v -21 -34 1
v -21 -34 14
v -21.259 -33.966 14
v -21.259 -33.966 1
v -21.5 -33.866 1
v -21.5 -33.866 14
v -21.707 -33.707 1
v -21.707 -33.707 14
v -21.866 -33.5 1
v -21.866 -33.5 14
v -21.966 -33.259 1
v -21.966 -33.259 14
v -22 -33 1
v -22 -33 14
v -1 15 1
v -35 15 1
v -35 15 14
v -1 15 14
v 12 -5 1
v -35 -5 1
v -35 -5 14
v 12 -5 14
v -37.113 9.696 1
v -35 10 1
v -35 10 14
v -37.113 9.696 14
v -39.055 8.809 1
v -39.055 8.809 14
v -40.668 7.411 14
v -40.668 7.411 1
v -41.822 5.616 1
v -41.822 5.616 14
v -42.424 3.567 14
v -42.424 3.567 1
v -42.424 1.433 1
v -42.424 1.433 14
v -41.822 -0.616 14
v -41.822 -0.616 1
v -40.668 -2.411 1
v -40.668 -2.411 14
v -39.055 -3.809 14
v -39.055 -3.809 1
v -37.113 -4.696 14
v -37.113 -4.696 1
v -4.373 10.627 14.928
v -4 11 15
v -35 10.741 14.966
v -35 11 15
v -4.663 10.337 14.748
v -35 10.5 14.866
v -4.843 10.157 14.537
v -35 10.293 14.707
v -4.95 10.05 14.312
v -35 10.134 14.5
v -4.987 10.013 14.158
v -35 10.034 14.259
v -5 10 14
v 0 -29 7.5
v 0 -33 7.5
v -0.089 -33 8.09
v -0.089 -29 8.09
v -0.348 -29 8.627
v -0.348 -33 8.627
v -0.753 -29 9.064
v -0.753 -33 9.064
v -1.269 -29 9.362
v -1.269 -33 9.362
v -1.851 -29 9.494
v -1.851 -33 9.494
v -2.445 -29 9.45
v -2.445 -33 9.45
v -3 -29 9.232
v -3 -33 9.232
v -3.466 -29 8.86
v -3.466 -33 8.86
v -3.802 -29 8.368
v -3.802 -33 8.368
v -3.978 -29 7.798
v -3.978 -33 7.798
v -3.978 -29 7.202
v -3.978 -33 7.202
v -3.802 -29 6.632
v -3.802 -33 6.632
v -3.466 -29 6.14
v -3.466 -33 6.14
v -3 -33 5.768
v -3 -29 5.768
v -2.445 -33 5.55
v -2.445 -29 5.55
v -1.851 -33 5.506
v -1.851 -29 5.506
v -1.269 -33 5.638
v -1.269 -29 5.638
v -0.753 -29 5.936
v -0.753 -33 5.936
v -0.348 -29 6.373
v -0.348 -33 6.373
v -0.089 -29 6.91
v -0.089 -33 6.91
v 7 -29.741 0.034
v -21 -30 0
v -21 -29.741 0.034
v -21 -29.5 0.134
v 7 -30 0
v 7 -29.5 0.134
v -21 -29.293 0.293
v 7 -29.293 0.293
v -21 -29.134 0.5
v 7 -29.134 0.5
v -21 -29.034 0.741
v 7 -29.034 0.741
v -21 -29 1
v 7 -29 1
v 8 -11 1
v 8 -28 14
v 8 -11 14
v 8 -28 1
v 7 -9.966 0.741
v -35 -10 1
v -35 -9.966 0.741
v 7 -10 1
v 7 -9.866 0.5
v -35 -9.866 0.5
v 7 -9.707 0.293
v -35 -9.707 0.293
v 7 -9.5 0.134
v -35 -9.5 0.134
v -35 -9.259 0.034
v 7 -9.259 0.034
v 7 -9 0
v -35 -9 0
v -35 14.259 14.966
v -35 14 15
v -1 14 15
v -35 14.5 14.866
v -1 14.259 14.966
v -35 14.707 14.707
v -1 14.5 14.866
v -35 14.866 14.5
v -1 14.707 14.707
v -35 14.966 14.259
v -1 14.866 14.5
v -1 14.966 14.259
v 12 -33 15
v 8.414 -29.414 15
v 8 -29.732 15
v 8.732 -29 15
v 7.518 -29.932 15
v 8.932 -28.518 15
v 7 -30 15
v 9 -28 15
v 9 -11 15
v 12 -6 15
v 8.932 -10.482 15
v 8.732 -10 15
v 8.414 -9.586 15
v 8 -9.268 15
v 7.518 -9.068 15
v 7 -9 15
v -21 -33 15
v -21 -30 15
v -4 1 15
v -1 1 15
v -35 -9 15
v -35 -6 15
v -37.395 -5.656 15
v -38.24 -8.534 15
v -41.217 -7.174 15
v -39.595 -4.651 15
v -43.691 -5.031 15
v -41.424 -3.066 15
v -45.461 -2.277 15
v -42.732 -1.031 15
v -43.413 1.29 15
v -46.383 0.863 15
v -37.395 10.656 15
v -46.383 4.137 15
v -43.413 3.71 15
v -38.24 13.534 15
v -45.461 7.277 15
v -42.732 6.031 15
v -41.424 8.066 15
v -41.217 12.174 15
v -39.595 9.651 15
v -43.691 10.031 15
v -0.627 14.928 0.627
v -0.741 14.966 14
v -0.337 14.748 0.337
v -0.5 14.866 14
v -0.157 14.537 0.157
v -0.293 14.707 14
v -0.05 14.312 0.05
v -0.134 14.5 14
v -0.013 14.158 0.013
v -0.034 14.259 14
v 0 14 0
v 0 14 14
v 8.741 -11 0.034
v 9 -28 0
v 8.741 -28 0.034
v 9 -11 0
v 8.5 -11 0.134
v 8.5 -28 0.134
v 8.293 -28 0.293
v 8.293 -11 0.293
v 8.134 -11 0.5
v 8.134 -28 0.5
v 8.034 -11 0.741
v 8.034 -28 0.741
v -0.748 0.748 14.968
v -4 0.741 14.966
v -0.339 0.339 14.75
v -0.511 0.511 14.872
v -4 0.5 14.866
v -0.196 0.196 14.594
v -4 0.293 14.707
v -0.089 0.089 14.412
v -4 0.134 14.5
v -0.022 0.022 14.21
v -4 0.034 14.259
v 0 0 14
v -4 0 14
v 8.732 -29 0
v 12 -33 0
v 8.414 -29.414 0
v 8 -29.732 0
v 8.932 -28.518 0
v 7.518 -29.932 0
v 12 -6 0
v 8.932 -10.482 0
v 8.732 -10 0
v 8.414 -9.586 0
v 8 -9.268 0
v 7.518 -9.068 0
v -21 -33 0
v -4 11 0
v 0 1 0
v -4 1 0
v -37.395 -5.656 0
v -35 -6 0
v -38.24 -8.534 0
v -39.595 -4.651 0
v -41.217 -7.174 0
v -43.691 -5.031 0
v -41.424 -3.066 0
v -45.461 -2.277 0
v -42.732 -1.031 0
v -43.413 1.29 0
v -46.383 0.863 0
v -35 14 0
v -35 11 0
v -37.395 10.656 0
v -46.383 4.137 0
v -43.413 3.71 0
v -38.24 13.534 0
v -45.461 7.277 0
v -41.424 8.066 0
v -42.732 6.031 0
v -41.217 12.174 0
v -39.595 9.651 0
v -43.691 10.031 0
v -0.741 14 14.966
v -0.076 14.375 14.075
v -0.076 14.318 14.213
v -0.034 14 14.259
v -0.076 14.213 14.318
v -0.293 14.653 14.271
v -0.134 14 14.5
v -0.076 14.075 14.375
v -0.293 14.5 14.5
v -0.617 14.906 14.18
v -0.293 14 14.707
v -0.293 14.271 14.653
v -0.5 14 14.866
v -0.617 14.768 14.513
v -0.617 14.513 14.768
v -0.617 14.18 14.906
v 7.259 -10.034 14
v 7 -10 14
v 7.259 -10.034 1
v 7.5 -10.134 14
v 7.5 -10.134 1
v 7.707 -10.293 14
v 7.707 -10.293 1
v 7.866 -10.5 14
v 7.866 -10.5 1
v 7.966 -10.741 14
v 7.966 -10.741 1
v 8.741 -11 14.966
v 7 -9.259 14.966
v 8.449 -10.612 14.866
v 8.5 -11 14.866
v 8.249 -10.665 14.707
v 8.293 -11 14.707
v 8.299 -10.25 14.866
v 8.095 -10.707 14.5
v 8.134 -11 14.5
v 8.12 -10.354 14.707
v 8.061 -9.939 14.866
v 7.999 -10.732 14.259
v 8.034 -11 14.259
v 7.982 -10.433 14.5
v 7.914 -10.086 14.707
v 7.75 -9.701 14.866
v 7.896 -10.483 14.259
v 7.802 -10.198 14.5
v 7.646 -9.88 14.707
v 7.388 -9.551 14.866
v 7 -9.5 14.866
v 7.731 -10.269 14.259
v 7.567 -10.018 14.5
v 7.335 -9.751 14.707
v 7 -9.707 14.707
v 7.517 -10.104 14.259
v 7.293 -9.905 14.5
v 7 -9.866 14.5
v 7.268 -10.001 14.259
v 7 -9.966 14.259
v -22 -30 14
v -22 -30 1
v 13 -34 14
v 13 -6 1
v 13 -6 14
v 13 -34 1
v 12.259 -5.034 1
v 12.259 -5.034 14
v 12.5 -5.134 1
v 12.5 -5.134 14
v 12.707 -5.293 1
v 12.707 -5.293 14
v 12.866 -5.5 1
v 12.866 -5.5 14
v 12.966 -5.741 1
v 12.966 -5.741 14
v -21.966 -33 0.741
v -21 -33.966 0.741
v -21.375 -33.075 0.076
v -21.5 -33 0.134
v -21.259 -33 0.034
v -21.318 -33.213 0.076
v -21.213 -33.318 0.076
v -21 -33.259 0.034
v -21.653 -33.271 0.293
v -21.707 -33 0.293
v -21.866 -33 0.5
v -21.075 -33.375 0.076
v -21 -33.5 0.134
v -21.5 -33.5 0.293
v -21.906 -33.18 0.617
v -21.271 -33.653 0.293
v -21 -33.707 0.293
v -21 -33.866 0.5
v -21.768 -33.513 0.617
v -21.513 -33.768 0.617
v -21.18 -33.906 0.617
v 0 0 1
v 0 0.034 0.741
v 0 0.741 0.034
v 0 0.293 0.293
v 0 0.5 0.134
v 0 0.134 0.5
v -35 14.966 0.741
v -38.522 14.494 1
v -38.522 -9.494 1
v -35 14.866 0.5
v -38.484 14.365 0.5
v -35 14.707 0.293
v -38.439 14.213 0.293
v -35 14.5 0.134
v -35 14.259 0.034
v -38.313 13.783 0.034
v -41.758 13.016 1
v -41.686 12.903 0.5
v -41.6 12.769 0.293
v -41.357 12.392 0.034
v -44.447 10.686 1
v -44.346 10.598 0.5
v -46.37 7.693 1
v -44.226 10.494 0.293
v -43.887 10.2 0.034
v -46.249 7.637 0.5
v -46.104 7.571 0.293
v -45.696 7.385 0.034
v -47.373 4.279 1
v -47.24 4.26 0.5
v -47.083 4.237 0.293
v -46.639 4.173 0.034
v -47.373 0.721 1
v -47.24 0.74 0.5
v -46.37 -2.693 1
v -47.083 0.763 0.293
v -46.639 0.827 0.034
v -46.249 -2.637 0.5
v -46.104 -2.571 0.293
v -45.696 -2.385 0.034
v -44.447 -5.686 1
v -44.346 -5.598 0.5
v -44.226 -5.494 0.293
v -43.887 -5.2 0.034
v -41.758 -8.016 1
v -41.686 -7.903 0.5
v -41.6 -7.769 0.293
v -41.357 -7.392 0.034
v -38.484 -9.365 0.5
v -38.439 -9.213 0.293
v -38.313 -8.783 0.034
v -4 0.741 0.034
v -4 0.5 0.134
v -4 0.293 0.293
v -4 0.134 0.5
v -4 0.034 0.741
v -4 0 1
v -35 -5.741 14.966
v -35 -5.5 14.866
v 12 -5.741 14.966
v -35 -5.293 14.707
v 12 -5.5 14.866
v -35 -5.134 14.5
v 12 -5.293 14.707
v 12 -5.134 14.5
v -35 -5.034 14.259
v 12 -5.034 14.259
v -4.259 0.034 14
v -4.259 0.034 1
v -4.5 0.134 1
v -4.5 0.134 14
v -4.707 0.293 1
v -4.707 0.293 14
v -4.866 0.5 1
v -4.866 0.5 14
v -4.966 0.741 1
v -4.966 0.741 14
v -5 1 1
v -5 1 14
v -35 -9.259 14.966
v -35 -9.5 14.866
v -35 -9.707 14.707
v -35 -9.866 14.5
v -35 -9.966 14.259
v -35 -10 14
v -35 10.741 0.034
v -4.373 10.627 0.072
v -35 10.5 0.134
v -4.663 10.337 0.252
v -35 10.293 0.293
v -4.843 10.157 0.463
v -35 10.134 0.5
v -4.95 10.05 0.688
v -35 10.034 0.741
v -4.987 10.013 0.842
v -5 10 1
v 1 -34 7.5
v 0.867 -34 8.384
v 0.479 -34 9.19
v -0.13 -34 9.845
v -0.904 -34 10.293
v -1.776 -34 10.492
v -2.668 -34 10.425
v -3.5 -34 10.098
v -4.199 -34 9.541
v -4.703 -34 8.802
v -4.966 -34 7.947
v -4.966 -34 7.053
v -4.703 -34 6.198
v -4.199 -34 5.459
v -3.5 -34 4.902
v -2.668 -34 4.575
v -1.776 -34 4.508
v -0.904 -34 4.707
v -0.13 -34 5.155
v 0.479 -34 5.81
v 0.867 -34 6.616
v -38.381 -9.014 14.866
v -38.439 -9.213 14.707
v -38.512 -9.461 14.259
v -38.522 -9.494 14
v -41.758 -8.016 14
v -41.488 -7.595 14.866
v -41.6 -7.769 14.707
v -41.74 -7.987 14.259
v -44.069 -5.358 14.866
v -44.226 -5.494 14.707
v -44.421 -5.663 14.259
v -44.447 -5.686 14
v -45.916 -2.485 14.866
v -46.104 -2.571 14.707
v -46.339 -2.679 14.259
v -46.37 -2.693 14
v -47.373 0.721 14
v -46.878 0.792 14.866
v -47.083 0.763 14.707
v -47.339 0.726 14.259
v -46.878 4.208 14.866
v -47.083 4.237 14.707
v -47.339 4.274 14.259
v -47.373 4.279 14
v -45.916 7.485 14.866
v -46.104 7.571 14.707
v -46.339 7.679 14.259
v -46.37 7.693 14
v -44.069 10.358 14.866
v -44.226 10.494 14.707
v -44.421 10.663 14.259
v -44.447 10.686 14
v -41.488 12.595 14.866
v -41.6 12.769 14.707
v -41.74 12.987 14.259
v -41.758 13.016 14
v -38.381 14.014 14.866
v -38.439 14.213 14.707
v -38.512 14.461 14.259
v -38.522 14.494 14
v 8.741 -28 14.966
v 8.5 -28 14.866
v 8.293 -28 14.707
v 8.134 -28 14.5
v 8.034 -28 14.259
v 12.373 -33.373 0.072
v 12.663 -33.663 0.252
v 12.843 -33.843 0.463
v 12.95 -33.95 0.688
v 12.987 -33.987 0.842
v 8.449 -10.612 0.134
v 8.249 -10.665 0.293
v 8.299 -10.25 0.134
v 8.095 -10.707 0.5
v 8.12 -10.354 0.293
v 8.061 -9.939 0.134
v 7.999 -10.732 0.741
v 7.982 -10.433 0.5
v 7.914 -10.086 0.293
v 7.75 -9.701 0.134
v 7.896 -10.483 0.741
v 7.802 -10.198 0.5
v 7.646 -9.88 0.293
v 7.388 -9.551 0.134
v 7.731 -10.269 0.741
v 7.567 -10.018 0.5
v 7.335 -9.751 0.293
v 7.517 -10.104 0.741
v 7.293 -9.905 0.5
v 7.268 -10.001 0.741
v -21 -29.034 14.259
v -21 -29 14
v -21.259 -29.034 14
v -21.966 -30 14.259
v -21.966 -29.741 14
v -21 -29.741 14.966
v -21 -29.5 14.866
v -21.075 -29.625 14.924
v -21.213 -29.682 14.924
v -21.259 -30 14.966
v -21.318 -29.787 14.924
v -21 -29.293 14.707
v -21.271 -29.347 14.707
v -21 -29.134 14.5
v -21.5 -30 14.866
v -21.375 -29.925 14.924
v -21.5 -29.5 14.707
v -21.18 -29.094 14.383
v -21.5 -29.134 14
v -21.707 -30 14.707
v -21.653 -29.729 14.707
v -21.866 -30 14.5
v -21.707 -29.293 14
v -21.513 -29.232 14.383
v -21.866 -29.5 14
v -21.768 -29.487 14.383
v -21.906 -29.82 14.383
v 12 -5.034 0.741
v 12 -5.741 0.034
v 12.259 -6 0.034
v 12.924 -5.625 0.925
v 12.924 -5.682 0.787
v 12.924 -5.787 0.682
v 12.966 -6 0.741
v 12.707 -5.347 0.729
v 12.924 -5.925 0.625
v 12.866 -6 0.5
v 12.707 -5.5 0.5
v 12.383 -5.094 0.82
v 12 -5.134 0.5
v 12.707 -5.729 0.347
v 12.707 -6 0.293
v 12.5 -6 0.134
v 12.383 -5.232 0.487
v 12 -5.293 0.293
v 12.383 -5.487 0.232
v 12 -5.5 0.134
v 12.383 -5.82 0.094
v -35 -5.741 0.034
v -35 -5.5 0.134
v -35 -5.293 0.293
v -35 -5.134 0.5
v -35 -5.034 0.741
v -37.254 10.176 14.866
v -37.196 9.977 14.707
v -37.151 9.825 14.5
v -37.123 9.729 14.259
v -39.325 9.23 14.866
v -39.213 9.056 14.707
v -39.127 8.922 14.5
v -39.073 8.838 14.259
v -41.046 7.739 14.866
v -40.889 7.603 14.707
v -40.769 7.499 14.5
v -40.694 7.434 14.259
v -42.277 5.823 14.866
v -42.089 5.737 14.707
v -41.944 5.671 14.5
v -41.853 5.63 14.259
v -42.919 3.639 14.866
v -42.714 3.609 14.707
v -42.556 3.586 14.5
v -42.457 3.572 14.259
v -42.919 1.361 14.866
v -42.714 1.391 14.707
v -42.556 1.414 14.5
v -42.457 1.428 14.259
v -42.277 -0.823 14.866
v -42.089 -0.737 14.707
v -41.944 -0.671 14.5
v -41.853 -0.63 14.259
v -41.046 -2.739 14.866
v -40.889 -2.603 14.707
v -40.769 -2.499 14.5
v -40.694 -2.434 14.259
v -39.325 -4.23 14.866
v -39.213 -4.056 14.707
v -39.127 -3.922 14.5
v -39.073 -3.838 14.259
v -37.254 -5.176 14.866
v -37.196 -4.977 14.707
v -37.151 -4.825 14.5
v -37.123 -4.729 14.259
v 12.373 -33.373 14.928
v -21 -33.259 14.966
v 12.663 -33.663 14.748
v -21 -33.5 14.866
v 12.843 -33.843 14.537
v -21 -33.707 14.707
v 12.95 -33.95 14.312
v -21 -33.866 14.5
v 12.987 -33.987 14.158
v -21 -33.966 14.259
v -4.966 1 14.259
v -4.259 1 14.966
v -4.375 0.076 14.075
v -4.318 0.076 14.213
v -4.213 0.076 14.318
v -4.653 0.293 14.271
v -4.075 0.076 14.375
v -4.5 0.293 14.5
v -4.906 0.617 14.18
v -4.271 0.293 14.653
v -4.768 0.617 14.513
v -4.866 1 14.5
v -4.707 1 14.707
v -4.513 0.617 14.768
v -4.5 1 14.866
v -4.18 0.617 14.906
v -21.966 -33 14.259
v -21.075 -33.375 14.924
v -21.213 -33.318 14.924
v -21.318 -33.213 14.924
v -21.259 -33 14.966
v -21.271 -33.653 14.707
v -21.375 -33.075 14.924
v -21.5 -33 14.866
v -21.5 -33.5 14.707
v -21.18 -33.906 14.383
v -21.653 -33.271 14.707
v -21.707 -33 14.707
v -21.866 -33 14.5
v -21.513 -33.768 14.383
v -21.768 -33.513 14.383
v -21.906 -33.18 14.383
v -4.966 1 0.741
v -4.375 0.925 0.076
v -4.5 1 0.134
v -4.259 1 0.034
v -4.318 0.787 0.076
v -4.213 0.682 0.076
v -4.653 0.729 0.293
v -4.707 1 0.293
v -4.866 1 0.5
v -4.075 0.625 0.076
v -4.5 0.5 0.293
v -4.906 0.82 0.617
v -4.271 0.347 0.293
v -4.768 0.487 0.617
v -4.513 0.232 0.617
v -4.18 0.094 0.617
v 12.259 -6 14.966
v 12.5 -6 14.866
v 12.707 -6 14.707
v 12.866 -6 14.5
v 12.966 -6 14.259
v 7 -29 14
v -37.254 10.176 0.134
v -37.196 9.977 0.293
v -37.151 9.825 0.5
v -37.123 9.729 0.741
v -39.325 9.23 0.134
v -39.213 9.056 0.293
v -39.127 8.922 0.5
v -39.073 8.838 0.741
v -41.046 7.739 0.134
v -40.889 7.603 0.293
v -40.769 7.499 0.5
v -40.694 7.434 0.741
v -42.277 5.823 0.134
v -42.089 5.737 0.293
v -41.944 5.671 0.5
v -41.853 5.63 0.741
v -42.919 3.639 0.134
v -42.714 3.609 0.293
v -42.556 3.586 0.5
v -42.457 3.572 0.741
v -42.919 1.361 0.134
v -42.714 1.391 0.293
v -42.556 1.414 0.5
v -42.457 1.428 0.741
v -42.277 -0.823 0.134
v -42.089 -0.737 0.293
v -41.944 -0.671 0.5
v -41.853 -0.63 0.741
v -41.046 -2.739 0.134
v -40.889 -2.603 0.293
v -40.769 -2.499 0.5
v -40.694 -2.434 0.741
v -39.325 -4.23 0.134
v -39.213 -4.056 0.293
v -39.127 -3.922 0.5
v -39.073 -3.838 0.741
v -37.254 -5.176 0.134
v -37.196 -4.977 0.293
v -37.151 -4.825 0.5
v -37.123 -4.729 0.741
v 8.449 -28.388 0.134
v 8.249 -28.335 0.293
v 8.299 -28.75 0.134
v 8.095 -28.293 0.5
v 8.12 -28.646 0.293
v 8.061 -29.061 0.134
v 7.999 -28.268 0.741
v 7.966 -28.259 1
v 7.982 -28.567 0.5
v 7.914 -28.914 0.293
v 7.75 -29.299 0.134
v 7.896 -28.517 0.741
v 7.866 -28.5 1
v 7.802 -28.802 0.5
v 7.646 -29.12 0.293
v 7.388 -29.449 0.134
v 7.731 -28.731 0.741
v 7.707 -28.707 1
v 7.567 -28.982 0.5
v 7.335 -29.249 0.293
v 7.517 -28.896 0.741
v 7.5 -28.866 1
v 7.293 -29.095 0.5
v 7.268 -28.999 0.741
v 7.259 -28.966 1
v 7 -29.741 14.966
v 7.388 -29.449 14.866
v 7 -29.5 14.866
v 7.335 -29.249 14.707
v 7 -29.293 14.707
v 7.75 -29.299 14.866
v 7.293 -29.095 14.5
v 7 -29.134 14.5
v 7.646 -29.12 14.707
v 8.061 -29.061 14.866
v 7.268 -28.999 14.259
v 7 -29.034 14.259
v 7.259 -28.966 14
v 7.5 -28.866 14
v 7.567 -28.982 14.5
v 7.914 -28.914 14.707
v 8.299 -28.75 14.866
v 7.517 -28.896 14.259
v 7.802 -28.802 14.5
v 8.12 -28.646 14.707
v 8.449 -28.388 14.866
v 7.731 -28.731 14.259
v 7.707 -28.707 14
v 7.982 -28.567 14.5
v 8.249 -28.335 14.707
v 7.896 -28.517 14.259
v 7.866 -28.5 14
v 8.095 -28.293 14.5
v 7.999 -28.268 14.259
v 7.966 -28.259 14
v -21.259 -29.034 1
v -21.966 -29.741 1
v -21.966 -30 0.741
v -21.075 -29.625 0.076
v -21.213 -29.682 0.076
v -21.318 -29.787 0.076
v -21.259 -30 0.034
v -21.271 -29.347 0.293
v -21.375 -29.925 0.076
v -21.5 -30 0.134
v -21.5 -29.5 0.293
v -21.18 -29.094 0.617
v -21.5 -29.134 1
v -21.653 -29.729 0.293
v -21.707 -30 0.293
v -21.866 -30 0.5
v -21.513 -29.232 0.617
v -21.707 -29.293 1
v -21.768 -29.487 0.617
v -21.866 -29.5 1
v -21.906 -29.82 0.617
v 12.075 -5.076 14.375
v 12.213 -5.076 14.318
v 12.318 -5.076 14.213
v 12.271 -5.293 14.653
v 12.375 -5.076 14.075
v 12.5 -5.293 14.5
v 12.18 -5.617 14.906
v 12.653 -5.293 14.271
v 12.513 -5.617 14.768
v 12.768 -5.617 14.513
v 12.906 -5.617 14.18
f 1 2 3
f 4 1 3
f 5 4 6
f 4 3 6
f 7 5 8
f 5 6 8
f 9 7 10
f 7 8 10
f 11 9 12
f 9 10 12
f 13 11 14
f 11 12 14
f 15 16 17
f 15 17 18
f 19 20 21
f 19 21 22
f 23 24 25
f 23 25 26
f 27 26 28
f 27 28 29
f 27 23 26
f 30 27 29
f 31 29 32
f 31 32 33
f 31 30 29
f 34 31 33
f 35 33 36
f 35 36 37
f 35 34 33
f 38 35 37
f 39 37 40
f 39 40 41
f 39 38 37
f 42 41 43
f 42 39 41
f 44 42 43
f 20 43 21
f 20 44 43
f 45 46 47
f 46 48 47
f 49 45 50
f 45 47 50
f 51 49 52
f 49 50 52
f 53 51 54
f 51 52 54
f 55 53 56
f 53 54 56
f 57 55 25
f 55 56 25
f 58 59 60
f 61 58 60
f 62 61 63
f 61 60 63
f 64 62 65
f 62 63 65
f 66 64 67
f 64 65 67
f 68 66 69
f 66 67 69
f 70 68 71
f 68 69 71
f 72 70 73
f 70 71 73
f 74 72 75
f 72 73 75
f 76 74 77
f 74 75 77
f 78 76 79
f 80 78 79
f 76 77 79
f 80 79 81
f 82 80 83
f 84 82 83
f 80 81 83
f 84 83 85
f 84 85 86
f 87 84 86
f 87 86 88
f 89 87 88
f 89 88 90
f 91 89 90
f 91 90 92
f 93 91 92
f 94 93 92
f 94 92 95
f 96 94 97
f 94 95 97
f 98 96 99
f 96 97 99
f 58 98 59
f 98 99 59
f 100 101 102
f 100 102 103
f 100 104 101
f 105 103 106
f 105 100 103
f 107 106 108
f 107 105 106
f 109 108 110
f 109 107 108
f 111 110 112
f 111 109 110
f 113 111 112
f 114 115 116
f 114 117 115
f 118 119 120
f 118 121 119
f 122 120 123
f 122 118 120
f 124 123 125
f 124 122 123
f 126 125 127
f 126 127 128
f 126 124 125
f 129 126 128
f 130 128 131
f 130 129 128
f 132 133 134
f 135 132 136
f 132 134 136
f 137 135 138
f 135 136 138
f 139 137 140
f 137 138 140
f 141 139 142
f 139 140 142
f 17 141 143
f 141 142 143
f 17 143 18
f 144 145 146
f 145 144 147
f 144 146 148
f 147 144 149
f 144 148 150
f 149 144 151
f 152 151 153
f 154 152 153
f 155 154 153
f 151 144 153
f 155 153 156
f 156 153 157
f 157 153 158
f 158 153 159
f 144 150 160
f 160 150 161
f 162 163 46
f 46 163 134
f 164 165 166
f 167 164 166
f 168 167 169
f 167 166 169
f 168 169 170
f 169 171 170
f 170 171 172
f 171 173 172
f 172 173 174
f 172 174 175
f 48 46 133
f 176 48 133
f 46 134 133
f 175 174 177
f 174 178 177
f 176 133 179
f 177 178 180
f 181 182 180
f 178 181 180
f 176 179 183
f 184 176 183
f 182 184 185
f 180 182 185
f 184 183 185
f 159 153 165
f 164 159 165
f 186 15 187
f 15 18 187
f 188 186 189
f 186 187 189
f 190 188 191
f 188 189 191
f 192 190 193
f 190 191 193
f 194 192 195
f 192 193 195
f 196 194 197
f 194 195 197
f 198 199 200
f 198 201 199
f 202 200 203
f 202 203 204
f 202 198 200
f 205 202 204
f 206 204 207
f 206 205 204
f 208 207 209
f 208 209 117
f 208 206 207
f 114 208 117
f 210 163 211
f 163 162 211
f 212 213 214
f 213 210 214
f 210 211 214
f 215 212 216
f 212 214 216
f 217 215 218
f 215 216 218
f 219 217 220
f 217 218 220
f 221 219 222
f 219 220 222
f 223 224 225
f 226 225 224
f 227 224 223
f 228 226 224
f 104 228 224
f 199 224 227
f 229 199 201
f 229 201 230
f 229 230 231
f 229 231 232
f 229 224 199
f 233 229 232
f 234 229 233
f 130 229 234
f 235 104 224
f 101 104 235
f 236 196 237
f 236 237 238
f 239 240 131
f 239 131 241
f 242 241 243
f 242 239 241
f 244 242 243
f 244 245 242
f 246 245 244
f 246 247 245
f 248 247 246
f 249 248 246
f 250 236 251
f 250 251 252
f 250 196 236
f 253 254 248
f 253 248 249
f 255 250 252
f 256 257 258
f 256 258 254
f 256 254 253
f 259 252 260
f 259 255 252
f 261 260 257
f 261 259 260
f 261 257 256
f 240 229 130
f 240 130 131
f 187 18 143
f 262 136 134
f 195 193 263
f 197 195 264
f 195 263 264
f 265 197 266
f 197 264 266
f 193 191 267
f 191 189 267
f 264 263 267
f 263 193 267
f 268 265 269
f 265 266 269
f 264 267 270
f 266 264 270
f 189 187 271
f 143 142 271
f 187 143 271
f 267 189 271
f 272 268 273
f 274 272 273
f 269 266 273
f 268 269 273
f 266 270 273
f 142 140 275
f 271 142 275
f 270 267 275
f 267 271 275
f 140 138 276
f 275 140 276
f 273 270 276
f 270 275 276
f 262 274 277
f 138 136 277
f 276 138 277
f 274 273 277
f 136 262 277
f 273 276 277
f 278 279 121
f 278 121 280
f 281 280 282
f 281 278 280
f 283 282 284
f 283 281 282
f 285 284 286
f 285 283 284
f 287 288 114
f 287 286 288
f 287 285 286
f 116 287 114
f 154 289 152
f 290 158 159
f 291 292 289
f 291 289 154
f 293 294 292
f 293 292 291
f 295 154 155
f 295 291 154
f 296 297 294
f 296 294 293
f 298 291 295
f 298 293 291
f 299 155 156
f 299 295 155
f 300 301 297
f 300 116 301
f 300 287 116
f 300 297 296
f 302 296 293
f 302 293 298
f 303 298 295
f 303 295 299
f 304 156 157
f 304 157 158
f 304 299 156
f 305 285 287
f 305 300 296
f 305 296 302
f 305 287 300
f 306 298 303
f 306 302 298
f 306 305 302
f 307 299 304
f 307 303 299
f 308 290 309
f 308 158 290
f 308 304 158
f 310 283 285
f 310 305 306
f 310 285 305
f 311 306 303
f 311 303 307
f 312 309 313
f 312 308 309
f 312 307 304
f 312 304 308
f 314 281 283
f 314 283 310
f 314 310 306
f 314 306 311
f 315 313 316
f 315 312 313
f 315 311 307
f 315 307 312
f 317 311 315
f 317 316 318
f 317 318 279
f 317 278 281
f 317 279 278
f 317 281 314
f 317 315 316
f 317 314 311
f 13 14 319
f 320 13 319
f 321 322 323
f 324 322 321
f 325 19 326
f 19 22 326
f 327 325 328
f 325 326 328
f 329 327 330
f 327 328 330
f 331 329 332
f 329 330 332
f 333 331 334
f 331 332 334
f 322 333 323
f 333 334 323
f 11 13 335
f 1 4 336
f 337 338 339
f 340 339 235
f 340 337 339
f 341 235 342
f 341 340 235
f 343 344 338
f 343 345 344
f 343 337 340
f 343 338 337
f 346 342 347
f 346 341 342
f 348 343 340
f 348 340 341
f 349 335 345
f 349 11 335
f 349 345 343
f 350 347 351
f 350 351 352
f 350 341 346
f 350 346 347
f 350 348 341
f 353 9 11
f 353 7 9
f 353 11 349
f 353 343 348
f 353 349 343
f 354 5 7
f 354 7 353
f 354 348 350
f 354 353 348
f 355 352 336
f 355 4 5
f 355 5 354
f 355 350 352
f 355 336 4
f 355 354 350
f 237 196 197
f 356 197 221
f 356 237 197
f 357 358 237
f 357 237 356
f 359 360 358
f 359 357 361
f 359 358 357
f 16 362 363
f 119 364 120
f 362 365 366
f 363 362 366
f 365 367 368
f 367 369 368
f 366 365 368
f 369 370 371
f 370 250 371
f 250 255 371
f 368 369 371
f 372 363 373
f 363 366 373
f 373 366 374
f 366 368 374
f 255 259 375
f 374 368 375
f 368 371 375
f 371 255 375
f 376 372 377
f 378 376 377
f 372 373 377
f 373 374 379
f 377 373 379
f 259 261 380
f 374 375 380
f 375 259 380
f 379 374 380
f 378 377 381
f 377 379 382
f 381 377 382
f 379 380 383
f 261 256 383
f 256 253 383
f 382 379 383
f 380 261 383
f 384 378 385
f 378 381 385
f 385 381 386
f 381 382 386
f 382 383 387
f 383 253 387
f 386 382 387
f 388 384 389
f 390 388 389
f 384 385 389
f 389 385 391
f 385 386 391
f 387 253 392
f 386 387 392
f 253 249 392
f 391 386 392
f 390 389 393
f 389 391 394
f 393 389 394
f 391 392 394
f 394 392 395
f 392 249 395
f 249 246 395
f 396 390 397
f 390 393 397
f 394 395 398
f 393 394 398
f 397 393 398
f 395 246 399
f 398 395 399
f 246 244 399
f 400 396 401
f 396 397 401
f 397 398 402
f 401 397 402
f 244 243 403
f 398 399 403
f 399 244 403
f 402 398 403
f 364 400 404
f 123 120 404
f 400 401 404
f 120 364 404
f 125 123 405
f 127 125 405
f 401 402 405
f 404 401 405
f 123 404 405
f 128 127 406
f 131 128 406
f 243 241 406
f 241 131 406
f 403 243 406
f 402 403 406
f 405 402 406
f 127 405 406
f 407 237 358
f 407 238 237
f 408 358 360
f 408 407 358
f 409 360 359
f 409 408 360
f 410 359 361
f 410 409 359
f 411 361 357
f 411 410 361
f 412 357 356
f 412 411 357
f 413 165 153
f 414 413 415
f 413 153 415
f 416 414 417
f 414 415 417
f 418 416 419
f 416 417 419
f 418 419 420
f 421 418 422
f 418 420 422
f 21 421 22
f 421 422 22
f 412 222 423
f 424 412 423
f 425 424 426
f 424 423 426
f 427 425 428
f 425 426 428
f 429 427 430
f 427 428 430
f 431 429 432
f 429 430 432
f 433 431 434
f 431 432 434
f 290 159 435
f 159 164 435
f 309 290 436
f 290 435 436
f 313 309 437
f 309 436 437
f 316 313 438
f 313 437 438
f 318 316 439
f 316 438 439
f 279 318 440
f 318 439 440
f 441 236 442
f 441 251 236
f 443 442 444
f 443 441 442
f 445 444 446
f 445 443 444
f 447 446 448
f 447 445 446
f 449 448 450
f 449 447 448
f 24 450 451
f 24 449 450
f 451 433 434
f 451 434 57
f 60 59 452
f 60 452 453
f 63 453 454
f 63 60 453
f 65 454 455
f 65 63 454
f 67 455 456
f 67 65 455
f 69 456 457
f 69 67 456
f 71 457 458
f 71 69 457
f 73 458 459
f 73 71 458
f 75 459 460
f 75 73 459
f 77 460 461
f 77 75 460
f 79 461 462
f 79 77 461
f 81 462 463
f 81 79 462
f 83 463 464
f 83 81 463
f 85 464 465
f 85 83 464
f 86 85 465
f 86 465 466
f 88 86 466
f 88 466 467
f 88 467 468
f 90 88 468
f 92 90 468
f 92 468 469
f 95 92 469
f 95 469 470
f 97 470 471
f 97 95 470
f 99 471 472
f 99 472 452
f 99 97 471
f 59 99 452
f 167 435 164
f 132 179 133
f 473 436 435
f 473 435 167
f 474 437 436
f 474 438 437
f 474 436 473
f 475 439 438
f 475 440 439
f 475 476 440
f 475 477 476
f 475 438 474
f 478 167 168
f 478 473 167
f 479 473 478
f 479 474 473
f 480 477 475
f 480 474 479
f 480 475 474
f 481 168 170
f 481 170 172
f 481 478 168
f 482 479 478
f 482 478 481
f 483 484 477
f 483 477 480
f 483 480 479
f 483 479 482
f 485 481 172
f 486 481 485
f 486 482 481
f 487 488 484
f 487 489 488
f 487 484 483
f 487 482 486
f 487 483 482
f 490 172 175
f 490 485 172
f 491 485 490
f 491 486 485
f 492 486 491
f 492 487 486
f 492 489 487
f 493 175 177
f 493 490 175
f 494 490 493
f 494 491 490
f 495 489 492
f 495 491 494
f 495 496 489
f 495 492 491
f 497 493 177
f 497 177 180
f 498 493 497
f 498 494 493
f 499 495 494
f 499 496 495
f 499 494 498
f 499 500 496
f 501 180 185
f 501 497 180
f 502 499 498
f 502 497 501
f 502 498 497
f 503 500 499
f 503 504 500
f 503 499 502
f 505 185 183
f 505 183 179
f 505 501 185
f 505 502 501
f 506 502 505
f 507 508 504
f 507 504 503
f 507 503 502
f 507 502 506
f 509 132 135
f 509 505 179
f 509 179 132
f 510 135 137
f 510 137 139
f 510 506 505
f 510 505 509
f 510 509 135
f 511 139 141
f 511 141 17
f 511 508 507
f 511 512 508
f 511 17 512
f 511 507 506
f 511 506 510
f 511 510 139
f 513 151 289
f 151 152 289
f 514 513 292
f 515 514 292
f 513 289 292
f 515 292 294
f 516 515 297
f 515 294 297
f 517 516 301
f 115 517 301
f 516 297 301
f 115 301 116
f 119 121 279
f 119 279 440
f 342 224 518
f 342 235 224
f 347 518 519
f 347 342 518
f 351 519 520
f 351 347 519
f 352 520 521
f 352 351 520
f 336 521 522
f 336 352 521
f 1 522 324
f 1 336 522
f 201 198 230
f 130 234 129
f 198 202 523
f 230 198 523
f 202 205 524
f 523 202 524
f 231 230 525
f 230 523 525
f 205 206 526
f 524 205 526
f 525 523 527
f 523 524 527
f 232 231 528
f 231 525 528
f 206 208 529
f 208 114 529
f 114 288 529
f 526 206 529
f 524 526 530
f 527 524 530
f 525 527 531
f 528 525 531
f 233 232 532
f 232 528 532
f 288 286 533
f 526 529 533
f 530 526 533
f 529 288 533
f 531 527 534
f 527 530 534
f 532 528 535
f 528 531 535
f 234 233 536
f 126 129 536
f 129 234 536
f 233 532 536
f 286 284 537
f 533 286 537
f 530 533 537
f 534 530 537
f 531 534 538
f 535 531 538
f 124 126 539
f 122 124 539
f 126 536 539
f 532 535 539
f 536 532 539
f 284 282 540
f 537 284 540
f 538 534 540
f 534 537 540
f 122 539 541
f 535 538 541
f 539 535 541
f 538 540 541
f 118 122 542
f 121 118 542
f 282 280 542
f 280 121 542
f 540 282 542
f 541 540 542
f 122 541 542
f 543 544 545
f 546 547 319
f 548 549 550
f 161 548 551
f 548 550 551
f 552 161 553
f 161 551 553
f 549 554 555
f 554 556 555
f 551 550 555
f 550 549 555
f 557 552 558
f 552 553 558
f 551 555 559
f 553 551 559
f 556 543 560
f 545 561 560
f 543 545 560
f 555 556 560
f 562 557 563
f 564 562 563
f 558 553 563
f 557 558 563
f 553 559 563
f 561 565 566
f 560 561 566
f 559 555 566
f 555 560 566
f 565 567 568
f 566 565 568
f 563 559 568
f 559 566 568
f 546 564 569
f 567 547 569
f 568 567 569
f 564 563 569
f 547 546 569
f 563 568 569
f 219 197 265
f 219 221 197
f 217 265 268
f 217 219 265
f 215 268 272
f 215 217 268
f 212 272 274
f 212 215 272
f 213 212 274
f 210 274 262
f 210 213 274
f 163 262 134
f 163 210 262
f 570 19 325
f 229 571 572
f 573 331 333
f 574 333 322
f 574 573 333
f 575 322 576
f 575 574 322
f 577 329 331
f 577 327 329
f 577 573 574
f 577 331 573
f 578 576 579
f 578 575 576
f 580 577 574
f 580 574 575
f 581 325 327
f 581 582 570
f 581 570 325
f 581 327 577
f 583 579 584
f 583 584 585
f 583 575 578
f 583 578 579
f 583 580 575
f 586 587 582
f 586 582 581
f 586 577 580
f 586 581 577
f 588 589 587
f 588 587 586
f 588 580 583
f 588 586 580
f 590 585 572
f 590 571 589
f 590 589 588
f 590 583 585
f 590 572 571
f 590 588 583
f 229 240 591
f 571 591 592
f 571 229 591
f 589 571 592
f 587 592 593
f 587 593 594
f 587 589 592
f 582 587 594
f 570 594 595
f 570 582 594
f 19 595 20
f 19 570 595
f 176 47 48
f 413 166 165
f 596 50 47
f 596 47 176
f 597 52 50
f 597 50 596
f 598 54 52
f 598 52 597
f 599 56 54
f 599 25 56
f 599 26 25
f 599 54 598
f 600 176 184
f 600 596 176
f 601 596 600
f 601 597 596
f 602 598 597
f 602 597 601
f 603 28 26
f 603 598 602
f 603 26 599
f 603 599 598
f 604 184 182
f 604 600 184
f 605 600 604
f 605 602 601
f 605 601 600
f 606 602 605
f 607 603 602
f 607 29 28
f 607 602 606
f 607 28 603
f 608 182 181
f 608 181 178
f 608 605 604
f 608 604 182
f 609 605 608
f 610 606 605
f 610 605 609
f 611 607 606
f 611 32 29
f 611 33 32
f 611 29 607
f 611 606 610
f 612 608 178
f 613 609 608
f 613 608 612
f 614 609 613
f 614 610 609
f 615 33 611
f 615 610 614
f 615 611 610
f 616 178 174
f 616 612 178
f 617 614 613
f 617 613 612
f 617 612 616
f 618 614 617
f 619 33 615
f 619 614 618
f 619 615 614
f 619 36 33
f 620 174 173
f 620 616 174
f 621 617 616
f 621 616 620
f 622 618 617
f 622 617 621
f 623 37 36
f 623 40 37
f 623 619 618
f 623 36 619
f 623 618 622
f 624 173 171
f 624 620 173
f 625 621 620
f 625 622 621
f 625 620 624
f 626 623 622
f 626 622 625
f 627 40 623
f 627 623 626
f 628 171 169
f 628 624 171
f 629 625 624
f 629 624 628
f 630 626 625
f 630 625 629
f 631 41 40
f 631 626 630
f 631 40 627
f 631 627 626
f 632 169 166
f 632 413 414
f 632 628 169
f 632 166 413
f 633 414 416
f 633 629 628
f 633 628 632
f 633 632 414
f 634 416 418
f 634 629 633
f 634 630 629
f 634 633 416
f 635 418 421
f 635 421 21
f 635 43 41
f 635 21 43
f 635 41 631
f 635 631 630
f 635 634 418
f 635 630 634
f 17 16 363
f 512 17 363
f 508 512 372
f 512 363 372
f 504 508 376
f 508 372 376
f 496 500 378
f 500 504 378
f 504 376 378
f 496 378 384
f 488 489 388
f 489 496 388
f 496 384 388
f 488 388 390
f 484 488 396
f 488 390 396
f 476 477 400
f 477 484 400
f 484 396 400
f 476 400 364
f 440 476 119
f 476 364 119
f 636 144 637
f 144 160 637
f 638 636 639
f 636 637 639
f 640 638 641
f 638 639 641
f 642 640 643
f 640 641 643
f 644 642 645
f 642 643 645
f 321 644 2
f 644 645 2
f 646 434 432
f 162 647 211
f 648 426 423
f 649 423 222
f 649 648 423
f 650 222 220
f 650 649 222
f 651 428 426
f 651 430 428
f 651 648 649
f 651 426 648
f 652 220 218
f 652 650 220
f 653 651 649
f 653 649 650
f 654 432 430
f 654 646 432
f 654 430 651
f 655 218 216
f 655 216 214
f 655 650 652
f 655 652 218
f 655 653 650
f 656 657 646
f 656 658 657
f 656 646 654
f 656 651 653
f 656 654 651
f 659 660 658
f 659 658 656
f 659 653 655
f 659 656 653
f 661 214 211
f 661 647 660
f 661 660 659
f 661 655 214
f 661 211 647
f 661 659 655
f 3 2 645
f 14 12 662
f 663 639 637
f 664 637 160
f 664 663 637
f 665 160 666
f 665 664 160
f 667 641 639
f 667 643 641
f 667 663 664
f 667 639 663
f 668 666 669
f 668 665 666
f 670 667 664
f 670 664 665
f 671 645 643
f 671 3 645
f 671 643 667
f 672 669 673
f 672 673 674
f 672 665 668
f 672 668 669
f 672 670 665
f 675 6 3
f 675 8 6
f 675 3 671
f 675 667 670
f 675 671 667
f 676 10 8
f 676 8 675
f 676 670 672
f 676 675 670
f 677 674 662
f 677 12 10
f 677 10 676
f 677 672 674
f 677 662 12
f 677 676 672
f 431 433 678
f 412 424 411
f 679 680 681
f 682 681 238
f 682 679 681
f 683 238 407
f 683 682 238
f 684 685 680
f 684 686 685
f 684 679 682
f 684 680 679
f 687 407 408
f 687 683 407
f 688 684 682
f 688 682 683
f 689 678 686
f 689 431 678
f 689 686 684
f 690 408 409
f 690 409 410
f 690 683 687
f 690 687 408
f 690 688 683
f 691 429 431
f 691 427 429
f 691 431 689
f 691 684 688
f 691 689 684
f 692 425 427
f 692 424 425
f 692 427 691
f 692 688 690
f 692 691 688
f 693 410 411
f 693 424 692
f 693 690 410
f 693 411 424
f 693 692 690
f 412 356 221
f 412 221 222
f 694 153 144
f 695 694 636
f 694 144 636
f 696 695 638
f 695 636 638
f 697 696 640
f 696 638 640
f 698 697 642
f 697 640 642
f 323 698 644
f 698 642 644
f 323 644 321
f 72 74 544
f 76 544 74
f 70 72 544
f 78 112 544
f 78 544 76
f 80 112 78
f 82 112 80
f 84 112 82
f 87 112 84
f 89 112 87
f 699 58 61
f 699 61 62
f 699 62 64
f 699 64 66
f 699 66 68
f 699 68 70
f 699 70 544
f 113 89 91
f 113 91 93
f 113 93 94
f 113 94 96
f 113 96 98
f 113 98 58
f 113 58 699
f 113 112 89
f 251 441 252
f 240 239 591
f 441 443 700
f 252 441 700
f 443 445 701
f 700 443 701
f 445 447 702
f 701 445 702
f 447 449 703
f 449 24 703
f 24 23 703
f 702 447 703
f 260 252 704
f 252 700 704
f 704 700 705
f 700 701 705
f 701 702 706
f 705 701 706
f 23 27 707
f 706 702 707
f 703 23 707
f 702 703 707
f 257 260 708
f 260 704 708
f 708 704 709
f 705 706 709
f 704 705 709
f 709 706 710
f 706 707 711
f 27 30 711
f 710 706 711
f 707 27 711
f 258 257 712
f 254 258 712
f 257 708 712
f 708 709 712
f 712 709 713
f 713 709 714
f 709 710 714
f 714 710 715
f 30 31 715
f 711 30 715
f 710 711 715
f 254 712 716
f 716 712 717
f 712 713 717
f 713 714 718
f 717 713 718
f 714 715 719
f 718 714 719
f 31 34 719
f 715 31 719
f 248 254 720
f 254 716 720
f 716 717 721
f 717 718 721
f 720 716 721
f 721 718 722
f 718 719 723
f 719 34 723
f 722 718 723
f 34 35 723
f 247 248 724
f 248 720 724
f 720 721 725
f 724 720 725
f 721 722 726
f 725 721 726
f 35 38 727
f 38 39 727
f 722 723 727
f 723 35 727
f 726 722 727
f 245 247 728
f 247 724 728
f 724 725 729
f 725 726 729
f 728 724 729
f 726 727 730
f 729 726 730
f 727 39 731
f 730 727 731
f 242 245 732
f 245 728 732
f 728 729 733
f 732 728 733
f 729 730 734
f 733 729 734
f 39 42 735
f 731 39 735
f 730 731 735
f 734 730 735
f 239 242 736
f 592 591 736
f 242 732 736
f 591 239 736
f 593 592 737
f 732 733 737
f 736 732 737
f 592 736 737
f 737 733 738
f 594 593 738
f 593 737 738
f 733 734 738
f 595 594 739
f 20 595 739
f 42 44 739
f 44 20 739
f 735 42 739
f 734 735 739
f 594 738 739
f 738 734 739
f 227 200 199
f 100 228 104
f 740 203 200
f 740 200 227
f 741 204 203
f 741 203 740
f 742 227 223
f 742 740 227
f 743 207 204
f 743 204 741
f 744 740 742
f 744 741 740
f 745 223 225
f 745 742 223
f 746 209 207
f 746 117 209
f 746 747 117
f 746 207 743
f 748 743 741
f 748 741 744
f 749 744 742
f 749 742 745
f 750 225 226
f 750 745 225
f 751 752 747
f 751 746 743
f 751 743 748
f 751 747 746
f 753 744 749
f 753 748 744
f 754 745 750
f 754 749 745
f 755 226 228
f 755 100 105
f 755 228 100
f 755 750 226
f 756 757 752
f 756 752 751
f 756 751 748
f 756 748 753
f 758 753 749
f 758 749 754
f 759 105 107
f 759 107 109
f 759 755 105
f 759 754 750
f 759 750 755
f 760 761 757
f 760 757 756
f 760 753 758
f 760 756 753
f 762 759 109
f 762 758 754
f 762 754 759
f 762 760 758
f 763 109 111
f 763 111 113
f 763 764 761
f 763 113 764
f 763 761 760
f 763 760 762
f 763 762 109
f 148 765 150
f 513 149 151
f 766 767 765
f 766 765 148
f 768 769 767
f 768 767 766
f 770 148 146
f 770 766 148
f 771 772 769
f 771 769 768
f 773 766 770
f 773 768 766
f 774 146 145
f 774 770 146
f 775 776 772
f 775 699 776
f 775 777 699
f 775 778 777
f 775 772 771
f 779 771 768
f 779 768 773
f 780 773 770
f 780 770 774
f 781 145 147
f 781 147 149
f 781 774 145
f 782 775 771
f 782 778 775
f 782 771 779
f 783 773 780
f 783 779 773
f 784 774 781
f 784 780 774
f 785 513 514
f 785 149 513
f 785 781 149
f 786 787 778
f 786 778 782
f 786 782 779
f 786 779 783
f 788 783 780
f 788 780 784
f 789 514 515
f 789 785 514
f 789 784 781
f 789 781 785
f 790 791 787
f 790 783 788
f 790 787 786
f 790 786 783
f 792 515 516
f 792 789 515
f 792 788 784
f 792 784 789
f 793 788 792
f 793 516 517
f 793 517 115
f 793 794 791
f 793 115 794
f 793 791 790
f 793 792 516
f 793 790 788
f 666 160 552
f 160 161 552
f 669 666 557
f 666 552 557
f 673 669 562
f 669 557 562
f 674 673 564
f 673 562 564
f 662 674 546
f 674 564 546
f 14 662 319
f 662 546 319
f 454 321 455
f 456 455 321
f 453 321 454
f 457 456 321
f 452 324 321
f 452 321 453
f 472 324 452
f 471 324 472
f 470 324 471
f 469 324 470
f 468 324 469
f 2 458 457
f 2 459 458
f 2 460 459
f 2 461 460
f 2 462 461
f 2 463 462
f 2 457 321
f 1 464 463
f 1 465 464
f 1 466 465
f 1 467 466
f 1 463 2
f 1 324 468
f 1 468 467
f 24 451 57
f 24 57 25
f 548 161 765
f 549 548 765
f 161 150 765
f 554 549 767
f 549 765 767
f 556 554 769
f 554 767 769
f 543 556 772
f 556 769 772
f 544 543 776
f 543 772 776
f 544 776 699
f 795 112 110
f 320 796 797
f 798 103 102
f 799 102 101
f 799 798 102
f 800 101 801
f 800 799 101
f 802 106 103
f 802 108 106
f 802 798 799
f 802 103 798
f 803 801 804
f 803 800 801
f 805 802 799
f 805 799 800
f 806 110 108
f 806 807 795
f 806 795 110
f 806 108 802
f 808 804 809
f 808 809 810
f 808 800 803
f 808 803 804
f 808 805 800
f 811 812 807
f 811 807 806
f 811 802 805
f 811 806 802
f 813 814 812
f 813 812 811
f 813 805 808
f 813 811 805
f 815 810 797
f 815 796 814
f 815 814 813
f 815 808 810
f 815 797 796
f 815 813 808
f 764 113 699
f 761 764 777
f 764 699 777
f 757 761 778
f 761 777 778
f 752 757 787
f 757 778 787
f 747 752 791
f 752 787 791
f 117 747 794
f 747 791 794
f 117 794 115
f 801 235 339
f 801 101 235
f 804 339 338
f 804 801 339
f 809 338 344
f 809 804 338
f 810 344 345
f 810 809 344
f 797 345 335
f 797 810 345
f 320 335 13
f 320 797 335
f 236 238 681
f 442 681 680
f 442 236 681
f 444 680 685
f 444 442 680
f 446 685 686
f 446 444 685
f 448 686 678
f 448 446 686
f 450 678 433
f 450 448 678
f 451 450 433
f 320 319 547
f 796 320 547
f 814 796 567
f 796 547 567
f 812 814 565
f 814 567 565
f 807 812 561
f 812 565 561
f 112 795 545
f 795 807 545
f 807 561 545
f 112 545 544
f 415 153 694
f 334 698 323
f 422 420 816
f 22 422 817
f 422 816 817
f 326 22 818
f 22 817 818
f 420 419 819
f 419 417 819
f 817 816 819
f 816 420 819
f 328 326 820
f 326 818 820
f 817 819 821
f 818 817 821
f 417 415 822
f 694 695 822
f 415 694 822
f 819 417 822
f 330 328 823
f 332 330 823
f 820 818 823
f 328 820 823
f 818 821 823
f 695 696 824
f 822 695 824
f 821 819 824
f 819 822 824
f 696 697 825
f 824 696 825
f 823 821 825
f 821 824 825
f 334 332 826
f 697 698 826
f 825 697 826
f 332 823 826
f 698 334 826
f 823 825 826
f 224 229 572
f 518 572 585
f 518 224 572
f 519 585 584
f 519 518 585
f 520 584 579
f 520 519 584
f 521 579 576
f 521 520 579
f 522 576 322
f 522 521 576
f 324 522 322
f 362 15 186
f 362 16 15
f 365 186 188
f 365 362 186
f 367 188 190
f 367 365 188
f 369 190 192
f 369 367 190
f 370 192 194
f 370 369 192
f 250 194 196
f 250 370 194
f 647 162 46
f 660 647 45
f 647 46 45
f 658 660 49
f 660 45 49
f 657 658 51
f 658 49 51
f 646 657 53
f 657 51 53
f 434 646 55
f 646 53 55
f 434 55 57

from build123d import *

# Parameters (mm, degrees)
PAD001_DEPTH    = 15
SKETCH003_R     = 2
POCKET001_DEPTH = 5
FILLET001_R     = 1
CHAMFER001_SIZE = 1


with BuildPart() as part:
    # Sketch002 → Pad001 (new body)
    with BuildSketch(Plane.XY):
        with BuildLine():
            Line((-35, 15), (0, 15))
            Line((0, 15), (0, 0))
            Line((0, 0), (-5, 0))
            Line((-5, 0), (-5, 10))
            Line((-5, 10), (-35, 10))
            ThreePointArc((-35, 10), (-42.5, 2.5), (-35, -5))
            Line((-35, -5), (13, -5))
            Line((13, -5), (13, -34))
            Line((13, -34), (-22, -34))
            Line((-22, -34), (-22, -29))
            Line((-22, -29), (8, -29))
            Line((8, -29), (8, -10))
            Line((8, -10), (-35, -10))
            ThreePointArc((-35, 15), (-47.5, 2.5), (-35, -10))
        make_face()
    extrude(amount=PAD001_DEPTH)

    # Sketch003 (on Face9 of Pad001) → Pocket001 (cut)
    with BuildSketch(Plane.XZ.offset(34)):
        with Locations((-2, 7.5)):
            Circle(SKETCH003_R)
    extrude(amount=-POCKET001_DEPTH, mode=Mode.SUBTRACT)

    # Fillet001
    fillet001_edges = [part.edges().sort_by_distance(p)[0] for p in [
        (-22, -29, 7.5),
        (-22, -34, 7.5),
        (-4.5, -34, 15),
        (-7, -29, 15),
        (-7, -29, 0),
        (13, -19.5, 15),
        (8, -19.5, 15),
        (-13.5, -10, 15),
        (-47.5, 2.5, 15),
        (-42.5, 2.5, 15),
        (-47.5, 2.5, 0),
        (-17.5, 15, 0),
        (-17.5, 15, 15),
        (0, 15, 7.5),
        (0, 7.5, 15),
        (-20, 10, 15),
        (-42.5, 2.5, 0),
        (-11, -5, 0),
        (-5, 5, 15),
        (-5, 0, 7.5),
        (13, -5, 7.5),
        (-2.5, 0, 15),
        (8, -29, 7.5),
        (8, -10, 7.5),
        (8, -19.5, 0),
        (-22, -31.5, 15),
        (-22, -31.5, 0),
        (-20, 10, 0),
        (-5, 5, 0),
        (-2.5, 0, 0),
        (-13.5, -10, 0),
        (-4.5, -34, 0),
        (13, -19.5, 0),
    ]]
    fillet(fillet001_edges, radius=FILLET001_R)

    # Chamfer001
    chamfer001_edges = [part.edges().sort_by_distance(p)[0] for p in [
        (-4, -34, 7.5),
    ]]
    chamfer(chamfer001_edges, length=CHAMFER001_SIZE)


solid = part.part
